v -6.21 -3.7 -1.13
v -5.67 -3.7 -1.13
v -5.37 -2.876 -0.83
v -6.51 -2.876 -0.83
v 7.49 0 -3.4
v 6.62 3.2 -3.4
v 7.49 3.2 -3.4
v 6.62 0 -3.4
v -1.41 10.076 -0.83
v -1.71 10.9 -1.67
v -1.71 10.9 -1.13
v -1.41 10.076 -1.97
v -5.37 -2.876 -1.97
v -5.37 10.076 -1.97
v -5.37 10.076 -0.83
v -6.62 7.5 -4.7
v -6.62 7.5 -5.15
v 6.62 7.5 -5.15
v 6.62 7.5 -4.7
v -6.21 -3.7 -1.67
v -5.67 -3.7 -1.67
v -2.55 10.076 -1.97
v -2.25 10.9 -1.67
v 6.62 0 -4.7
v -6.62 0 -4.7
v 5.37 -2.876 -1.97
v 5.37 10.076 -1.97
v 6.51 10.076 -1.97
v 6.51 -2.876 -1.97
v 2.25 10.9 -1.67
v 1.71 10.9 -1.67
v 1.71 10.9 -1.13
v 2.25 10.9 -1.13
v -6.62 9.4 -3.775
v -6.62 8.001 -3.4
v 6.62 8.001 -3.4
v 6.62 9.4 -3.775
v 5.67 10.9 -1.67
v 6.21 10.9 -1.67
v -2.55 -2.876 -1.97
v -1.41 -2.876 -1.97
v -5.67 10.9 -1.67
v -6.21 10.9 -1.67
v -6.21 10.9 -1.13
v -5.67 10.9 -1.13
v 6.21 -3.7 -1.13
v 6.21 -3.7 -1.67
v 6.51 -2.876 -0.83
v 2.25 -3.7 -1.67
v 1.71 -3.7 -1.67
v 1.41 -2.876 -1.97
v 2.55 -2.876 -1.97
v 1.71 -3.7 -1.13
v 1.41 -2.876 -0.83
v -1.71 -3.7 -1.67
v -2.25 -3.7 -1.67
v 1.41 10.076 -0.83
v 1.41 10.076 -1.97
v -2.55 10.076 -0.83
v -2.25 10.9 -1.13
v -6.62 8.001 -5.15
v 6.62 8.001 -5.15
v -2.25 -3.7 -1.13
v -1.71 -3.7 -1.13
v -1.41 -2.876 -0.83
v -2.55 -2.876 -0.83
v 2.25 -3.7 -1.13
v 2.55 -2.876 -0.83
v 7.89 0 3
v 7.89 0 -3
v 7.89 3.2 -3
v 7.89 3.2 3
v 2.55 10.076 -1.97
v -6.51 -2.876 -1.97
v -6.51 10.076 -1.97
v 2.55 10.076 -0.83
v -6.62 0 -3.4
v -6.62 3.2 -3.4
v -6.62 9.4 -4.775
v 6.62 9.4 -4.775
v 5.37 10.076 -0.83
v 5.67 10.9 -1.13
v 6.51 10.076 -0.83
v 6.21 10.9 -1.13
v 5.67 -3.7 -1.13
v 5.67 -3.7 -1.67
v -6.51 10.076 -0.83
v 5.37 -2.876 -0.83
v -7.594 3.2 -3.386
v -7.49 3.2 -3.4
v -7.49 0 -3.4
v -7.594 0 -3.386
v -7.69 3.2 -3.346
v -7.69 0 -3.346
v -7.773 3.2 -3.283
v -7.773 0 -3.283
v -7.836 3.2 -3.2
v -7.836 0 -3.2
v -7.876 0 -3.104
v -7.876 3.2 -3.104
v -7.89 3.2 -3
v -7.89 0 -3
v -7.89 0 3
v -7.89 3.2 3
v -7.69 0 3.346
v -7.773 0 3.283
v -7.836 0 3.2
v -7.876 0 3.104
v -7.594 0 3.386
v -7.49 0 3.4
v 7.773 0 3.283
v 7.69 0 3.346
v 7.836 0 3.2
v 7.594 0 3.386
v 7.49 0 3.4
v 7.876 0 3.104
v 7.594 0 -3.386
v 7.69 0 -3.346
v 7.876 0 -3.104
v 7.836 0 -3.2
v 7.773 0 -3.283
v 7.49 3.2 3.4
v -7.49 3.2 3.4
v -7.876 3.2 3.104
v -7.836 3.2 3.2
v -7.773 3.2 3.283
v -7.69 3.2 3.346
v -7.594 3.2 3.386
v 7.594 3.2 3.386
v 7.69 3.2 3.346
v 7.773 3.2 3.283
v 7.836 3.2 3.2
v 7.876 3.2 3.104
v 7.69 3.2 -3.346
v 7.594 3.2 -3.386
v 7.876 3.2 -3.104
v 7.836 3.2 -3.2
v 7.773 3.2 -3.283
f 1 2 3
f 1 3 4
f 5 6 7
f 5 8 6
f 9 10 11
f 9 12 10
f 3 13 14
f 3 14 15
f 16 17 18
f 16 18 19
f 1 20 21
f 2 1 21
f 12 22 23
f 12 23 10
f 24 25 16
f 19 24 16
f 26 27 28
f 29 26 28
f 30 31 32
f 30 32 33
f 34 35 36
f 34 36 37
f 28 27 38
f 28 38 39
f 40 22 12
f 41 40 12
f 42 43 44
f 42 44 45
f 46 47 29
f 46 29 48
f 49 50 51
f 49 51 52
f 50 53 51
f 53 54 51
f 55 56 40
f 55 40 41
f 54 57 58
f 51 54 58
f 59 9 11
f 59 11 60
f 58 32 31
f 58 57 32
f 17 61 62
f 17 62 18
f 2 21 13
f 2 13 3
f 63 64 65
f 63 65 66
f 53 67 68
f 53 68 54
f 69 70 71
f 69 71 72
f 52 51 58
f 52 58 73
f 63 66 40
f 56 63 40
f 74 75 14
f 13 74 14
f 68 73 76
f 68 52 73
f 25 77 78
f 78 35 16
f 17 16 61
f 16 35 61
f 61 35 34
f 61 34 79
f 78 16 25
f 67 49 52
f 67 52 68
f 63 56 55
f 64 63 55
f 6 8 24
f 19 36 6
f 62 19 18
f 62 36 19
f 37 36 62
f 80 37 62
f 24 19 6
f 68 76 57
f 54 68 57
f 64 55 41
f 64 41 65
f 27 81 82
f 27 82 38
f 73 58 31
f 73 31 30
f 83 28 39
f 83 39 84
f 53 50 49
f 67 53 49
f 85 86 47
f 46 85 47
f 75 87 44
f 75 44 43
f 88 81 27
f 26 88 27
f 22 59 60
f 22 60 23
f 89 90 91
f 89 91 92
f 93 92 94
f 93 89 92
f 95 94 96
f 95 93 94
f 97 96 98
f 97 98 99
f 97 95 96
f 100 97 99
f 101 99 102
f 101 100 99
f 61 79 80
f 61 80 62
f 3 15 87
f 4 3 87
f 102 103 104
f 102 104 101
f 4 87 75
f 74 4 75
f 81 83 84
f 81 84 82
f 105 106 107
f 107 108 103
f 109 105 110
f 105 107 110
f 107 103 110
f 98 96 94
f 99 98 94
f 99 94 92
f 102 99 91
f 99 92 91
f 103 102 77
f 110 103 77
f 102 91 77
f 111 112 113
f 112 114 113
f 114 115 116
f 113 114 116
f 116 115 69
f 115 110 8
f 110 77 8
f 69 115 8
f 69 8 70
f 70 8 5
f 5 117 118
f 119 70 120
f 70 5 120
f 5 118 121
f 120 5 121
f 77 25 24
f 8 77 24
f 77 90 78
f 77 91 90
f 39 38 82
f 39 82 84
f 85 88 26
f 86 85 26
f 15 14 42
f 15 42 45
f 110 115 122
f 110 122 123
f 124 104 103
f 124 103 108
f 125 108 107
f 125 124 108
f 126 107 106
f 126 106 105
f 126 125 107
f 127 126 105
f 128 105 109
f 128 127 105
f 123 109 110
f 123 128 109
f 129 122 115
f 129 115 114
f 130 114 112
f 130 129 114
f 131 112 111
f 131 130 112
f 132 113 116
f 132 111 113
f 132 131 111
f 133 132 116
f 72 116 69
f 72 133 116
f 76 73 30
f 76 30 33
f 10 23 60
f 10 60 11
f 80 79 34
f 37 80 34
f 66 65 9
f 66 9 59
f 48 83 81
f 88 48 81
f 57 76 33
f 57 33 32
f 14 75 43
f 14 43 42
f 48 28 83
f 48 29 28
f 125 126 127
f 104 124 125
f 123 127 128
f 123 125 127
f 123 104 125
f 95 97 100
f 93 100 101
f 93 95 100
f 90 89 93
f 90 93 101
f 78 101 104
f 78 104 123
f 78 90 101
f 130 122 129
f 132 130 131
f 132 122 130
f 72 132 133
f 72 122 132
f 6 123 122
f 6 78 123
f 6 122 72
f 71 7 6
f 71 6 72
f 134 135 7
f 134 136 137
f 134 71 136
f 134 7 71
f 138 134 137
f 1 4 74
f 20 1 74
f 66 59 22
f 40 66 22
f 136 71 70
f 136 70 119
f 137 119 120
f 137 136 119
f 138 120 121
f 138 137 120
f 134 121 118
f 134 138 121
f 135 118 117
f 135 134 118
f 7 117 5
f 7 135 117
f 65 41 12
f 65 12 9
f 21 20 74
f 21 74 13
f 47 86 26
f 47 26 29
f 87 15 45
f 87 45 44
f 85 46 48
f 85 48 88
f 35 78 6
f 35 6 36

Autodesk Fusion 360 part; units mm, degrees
sketch "Skizze1" plane through (0, 0, 0) normal (0, 1, 0) x (1, 0, 0)
  line L0 (-7.89, 3.4) -> (7.89, 3.4)
  line L1 (7.89, 3.4) -> (7.89, -3.4)
  line L2 (7.89, -3.4) -> (-7.89, -3.4)
  line L3 (-7.89, -3.4) -> (-7.89, 3.4)
  line L4 (0, 3.4) -> (0, -3.4) construction
  dimension "d9" = 15.78
  dimension "d10" = 6.8
extrude "Extrusion1" add sketch "Skizze1" along normal blind 3.2 makes body 1
sketch "Skizze3" plane through (0, 0, 0) normal (1, 0, 0) x (0, 0, -1)
  line L0 (3.4, 0) -> (3.4, 3.2)
  line L1 (3.4, 0) -> (4.7, 0)
  line L2 (4.7, 0) -> (4.7, 9.4)
  line L3 (4.7, 9.4) -> (3.4, 9.4) construction
  line L4 (3.4, 9.4) -> (3.4, 0)
  line L5 (4.7, 9.4) -> (5.15, 9.4)
  line L6 (5.15, 9.4) -> (5.15, 0)
  line L7 (5.15, 0) -> (4.7, 0)
  line L8 (4.7, 0) -> (4.7, 9.4) construction
  line L9 (3.4, 8.0005) -> (3.775, 9.4)
  line L10 (4.775, 9.4) -> (5.15, 8.0005)
  line L11 (5.15, 7.5005) -> (4.7, 7.5005)
  line L12 (4.775, 9.4) -> (3.775, 9.4)
  line L13 (3.775, 9.4) -> (4.775, 9.4) construction
  line L14 (4.775, 9.4) -> (5.15, 9.4) construction
  line L15 (3.775, 9.4) -> (3.4, 9.4) construction
  line L16 (5.15, 9.4) -> (4.775, 9.4) construction
  line L17 (5.15, 8.0005) -> (5.15, 7.5005) construction
  line L18 (5.15, 7.5005) -> (5.15, 8.0005) construction
  line L19 (5.15, 9.4) -> (3.4, 9.4)
  line L20 (5.15, 0) -> (3.4, 0)
  dimension "d31" = 9.4
  dimension "d33" = 1.3
  dimension "d35" = 90
  dimension "d36" = 75
  dimension "d37" = 75
  dimension "d39" = 1
  dimension "d42" = 0.5
  dimension "d48" = 1.75
sketch "Skizze2" plane through (0, 0, 0) normal (0, 1, 0) x (1, 0, 0)
  line L0 (-5.37, 0.83) -> (-6.51, 0.83)
  line L1 (-6.51, 0.83) -> (-6.51, 1.97)
  line L2 (-6.51, 1.97) -> (-5.37, 1.97)
  line L3 (-5.37, 1.97) -> (-5.37, 0.83)
  line L4 (-7.89, 3.4) -> (7.89, 3.4)
  line L5 (7.89, 3.4) -> (7.89, -3.4)
  line L6 (7.89, -3.4) -> (-7.89, -3.4)
  line L7 (-7.89, -3.4) -> (-7.89, 3.4)
  line L8 (0, 3.4) -> (0, 1.4) construction
  line L9 (-5.37, 1.4) -> (-6.51, 1.4) construction
  line L10 (0, 1.4) -> (-5.94, 1.4)
  point P0 (-5.94, 1.4)
  dimension "d16" = 1.14
  dimension "d17" = 1.14
  dimension "d24" = 2
  dimension "d26" = 5.94
extrude "Extrusion3" add sketch "Skizze3" along normal mid plane 13.24 contours L0 L1 L2 L4 L9 L12 L19 L20 | L2 L5 L6 L10 L11 L12 L19 bodies 1
extrude "Extrusion2" add sketch "Skizze2" along normal blind 10.9 and the other way blind 3.7 separate body contours L0 L1 L2 L3 makes body 2
chamfer "Fase2" distance 0.3 angle 70 8 edges at (-5.94, 10.9, -0.83) (-5.37, 10.9, -1.4) (-5.94, 10.9, -1.97) (-6.51, 10.9, -1.4) (-5.37, -3.7, -1.4) (-5.94, -3.7, -0.83) (-6.51, -3.7, -1.4) (-5.94, -3.7, -1.97) measured on face at (-5.75, 10.9, -1.21) measured on face at (-5.75, 10.9, -1.21) measured on face at (-5.75, 10.9, -1.21) measured on face at (-5.75, 10.9, -1.21) measured on face at (-5.75, -3.7, -1.21) measured on face at (-5.75, -3.7, -1.21) measured on face at (-5.75, -3.7, -1.21) measured on face at (-5.75, -3.7, -1.21) on bodies 2
pattern_linear "R-Anordnung1" count 4 spacing 3.96 along (1, 0, 0) of bodies 2 makes body 3 at (-1.79, 1.4414, -0.83) makes body 4 at (2.17, 1.4414, -0.83) makes body 5 at (6.13, 1.4414, -0.83)
fillet "Abrundung1" radius 0.4 4 edges at (7.89, 1.6, -3.4) (7.89, 1.6, 3.4) (-7.89, 1.6, 3.4) (-7.89, 1.6, -3.4) on bodies 1
equation "n = 4" comment "Number of pins"
equation "P = 3.96 mm" comment "Pin pitch"
equation "B1 = A1 + ( 1.95 mm * 2 )" comment "Width of bottom plate"
equation "A1 = ( n - 1 ) * P" comment "Total width of all pins"
equation "C1 = 6.8 mm" comment "Height of bottom plate"
equation "H1 = 9.4 mm" comment "Height of latching plate"
equation "O1 = 2 mm" comment "Vertical offset pin-center to bottom plate border"
equation "d9 = B1"
equation "d10 = C1"
equation "D1 = 3.2 mm" comment "Total depth of bottom plate"
equation "Pw = 1.14 mm" comment "Width & height of square pin"
equation "d13 = D1"
equation "d16 = Pw"
equation "d17 = Pw"
equation "LPinTop = 7.7 mm + D1" comment "Length of the pin measured from the bottom plane to the top of the pin (away from PCB)"
equation "LPinBottom = 14.6 mm - LPinTop" comment "Length of the pin in bottom direction, measured from the bottom plane"
equation "d20 = LPinTop"
equation "d22 = LPinBottom"
equation "d24 = O1"
equation "Pin1XOffset = ( ( n - 1 ) * P ) / 2" comment "First pin X offset measured from the X axis"
equation "d26 = Pin1XOffset"
equation "d27 = n"
equation "d29 = P"
equation "d31 = H1"
equation "D2 = 1.3 mm" comment "(Measured) depth of latching plate (narrowest section)"
equation "d33 = D2"
equation "d35 = alpha"
equation "d36 = 90 deg - beta"
equation "d37 = 90 deg - beta"
equation "Wx1 = 1.0 mm" comment "(Measured) Width of the topmost part of the latching plate"
equation "Hx1 = 0.5 mm" comment "(Measured) Height of the latching surface facing away from the pins"
equation "alpha = 90 deg" comment "Angle of the latching surface. Shown by the datasheet as ~45°but real parts have 90°"
equation "d42 = Hx1"
equation "beta = 15 deg" comment "(Estimated) Latching plate tapering angle"
equation "WL1 = 1.27 mm" comment "(Measured) With of the section of the bottom plate where there is no latching plate per side)"
equation "d45 = B1 - ( WL1 * 2 )"
equation "Dlatch = 1.75 mm" comment "(Measured) Total depth of latching plate"
equation "d48 = Dlatch"
equation "d54 = delta"
equation "delta = 70 deg" comment "(Estimated) Taper angle of the pin top & bottoms"
